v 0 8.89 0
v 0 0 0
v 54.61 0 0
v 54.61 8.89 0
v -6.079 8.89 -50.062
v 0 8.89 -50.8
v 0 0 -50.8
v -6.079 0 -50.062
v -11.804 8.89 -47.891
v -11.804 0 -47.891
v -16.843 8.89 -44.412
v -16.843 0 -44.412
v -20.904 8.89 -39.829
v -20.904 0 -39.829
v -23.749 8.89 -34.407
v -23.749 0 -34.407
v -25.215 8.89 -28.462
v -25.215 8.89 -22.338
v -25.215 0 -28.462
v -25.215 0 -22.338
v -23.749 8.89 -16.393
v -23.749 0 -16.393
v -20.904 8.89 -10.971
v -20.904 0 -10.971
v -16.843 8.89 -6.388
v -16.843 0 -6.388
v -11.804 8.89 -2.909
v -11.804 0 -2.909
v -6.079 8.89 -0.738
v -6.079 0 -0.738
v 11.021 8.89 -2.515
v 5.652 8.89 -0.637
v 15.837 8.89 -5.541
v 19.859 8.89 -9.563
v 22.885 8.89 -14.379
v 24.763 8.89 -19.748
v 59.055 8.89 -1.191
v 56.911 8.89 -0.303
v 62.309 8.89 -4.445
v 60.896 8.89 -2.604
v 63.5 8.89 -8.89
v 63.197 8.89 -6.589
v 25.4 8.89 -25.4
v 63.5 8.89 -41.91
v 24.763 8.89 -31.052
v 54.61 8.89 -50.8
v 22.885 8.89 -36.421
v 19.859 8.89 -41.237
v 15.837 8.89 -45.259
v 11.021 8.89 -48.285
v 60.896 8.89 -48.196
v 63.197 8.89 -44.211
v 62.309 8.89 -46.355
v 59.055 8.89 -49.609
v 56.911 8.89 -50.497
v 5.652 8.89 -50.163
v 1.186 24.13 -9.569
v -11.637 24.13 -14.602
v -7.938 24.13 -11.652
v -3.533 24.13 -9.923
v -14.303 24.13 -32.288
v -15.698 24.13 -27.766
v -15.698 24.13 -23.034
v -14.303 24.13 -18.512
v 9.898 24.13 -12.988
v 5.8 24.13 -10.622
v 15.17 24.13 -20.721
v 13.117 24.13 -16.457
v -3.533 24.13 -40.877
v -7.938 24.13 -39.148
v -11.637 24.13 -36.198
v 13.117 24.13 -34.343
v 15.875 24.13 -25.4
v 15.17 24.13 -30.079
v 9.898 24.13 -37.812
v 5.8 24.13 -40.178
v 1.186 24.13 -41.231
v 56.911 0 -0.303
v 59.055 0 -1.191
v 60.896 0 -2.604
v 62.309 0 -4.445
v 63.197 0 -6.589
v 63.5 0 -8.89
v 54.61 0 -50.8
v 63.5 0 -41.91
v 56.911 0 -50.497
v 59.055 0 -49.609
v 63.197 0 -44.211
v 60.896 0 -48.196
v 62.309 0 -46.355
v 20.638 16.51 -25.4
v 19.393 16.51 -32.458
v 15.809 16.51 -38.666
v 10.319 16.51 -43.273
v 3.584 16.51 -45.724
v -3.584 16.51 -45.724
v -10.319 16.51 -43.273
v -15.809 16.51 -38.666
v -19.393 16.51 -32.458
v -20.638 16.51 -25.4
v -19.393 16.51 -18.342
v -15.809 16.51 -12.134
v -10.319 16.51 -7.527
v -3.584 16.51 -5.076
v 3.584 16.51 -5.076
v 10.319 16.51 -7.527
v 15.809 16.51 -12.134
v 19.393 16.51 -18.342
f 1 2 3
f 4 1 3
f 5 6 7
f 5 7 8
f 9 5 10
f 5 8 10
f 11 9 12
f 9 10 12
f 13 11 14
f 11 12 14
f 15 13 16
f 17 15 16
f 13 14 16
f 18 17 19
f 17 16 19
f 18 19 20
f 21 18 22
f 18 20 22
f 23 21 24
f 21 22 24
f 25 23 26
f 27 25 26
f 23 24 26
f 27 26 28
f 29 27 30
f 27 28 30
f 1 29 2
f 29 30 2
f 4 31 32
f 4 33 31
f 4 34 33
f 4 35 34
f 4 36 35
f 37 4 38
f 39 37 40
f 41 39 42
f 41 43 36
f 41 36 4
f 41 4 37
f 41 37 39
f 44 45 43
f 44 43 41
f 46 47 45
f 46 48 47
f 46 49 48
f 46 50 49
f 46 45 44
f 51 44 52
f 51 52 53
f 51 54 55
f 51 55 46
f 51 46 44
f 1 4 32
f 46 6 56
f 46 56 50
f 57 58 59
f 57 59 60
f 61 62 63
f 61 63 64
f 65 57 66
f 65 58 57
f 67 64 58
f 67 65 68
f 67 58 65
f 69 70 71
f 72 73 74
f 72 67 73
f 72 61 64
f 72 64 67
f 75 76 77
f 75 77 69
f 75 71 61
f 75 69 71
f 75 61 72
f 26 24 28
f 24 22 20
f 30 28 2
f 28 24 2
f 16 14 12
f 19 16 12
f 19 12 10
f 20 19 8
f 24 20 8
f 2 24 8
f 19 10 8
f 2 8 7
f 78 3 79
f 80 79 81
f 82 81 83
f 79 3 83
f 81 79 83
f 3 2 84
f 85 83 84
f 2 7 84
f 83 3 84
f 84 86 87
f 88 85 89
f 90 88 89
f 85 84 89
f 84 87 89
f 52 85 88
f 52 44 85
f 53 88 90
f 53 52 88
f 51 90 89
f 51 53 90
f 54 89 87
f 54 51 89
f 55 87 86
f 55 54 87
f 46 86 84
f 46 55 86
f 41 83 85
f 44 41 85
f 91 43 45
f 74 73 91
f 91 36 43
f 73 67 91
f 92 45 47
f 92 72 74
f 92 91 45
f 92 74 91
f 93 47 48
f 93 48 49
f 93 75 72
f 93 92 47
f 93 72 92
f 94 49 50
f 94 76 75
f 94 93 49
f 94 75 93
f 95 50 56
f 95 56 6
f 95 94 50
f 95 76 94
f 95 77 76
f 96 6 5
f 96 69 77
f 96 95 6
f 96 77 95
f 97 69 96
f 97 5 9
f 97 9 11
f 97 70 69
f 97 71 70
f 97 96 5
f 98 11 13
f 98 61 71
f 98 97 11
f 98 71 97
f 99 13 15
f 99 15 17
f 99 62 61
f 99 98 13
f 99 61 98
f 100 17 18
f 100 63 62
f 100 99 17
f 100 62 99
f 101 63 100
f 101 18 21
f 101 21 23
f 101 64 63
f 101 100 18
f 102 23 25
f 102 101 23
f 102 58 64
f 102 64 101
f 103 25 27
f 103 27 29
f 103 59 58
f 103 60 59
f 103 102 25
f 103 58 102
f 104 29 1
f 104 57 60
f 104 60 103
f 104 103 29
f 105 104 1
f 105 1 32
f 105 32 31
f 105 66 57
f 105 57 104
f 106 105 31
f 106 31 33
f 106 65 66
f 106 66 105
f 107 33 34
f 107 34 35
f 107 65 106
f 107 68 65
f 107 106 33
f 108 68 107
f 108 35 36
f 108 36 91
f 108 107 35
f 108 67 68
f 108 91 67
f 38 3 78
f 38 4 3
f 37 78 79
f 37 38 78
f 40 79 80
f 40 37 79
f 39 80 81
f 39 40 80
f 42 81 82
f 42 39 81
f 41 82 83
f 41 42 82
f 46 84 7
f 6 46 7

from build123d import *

# Parameters (mm, degrees)
BOSS_EXTRUDE1_DEPTH = 8.89
FILLET1_R           = 8.89
SKETCH4_R           = 25.4
SKETCH11_R          = 15.875


with BuildPart() as part:
    # Sketch1 → Boss-Extrude1 (new body)
    with BuildSketch(Plane(origin=(0, 0, 0), x_dir=(1, 0, 0), z_dir=(0, 1, 0))):
        with BuildLine():
            Line((0, 0), (63.5, 0))
            Line((63.5, 0), (63.5, 50.8))
            Line((63.5, 50.8), (0, 50.8))
            ThreePointArc((0, 50.8), (-25.4, 25.4), (0, 0))
        make_face()
    extrude(amount=BOSS_EXTRUDE1_DEPTH)

    # Fillet1
    fillet1_edges = [part.edges().sort_by_distance(p)[0] for p in [
        (63.5, 4.445, -50.8),
        (63.5, 4.445, 0),
    ]]
    fillet(fillet1_edges, radius=FILLET1_R)

    # Sketch4 → Loft2 section 0
    with BuildSketch(Plane(origin=(0, 8.89, 0), x_dir=(1, 0, 0), z_dir=(0, 1, 0))):
        with Locations((0, 25.4)):
            Circle(SKETCH4_R)
    # Sketch11 → Loft2 section 1
    with BuildSketch(Plane(origin=(0, 24.13, 0), x_dir=(1, 0, 0), z_dir=(0, 1, 0))):
        with Locations((0, 25.4)):
            Circle(SKETCH11_R)
    loft()


solid = part.part
